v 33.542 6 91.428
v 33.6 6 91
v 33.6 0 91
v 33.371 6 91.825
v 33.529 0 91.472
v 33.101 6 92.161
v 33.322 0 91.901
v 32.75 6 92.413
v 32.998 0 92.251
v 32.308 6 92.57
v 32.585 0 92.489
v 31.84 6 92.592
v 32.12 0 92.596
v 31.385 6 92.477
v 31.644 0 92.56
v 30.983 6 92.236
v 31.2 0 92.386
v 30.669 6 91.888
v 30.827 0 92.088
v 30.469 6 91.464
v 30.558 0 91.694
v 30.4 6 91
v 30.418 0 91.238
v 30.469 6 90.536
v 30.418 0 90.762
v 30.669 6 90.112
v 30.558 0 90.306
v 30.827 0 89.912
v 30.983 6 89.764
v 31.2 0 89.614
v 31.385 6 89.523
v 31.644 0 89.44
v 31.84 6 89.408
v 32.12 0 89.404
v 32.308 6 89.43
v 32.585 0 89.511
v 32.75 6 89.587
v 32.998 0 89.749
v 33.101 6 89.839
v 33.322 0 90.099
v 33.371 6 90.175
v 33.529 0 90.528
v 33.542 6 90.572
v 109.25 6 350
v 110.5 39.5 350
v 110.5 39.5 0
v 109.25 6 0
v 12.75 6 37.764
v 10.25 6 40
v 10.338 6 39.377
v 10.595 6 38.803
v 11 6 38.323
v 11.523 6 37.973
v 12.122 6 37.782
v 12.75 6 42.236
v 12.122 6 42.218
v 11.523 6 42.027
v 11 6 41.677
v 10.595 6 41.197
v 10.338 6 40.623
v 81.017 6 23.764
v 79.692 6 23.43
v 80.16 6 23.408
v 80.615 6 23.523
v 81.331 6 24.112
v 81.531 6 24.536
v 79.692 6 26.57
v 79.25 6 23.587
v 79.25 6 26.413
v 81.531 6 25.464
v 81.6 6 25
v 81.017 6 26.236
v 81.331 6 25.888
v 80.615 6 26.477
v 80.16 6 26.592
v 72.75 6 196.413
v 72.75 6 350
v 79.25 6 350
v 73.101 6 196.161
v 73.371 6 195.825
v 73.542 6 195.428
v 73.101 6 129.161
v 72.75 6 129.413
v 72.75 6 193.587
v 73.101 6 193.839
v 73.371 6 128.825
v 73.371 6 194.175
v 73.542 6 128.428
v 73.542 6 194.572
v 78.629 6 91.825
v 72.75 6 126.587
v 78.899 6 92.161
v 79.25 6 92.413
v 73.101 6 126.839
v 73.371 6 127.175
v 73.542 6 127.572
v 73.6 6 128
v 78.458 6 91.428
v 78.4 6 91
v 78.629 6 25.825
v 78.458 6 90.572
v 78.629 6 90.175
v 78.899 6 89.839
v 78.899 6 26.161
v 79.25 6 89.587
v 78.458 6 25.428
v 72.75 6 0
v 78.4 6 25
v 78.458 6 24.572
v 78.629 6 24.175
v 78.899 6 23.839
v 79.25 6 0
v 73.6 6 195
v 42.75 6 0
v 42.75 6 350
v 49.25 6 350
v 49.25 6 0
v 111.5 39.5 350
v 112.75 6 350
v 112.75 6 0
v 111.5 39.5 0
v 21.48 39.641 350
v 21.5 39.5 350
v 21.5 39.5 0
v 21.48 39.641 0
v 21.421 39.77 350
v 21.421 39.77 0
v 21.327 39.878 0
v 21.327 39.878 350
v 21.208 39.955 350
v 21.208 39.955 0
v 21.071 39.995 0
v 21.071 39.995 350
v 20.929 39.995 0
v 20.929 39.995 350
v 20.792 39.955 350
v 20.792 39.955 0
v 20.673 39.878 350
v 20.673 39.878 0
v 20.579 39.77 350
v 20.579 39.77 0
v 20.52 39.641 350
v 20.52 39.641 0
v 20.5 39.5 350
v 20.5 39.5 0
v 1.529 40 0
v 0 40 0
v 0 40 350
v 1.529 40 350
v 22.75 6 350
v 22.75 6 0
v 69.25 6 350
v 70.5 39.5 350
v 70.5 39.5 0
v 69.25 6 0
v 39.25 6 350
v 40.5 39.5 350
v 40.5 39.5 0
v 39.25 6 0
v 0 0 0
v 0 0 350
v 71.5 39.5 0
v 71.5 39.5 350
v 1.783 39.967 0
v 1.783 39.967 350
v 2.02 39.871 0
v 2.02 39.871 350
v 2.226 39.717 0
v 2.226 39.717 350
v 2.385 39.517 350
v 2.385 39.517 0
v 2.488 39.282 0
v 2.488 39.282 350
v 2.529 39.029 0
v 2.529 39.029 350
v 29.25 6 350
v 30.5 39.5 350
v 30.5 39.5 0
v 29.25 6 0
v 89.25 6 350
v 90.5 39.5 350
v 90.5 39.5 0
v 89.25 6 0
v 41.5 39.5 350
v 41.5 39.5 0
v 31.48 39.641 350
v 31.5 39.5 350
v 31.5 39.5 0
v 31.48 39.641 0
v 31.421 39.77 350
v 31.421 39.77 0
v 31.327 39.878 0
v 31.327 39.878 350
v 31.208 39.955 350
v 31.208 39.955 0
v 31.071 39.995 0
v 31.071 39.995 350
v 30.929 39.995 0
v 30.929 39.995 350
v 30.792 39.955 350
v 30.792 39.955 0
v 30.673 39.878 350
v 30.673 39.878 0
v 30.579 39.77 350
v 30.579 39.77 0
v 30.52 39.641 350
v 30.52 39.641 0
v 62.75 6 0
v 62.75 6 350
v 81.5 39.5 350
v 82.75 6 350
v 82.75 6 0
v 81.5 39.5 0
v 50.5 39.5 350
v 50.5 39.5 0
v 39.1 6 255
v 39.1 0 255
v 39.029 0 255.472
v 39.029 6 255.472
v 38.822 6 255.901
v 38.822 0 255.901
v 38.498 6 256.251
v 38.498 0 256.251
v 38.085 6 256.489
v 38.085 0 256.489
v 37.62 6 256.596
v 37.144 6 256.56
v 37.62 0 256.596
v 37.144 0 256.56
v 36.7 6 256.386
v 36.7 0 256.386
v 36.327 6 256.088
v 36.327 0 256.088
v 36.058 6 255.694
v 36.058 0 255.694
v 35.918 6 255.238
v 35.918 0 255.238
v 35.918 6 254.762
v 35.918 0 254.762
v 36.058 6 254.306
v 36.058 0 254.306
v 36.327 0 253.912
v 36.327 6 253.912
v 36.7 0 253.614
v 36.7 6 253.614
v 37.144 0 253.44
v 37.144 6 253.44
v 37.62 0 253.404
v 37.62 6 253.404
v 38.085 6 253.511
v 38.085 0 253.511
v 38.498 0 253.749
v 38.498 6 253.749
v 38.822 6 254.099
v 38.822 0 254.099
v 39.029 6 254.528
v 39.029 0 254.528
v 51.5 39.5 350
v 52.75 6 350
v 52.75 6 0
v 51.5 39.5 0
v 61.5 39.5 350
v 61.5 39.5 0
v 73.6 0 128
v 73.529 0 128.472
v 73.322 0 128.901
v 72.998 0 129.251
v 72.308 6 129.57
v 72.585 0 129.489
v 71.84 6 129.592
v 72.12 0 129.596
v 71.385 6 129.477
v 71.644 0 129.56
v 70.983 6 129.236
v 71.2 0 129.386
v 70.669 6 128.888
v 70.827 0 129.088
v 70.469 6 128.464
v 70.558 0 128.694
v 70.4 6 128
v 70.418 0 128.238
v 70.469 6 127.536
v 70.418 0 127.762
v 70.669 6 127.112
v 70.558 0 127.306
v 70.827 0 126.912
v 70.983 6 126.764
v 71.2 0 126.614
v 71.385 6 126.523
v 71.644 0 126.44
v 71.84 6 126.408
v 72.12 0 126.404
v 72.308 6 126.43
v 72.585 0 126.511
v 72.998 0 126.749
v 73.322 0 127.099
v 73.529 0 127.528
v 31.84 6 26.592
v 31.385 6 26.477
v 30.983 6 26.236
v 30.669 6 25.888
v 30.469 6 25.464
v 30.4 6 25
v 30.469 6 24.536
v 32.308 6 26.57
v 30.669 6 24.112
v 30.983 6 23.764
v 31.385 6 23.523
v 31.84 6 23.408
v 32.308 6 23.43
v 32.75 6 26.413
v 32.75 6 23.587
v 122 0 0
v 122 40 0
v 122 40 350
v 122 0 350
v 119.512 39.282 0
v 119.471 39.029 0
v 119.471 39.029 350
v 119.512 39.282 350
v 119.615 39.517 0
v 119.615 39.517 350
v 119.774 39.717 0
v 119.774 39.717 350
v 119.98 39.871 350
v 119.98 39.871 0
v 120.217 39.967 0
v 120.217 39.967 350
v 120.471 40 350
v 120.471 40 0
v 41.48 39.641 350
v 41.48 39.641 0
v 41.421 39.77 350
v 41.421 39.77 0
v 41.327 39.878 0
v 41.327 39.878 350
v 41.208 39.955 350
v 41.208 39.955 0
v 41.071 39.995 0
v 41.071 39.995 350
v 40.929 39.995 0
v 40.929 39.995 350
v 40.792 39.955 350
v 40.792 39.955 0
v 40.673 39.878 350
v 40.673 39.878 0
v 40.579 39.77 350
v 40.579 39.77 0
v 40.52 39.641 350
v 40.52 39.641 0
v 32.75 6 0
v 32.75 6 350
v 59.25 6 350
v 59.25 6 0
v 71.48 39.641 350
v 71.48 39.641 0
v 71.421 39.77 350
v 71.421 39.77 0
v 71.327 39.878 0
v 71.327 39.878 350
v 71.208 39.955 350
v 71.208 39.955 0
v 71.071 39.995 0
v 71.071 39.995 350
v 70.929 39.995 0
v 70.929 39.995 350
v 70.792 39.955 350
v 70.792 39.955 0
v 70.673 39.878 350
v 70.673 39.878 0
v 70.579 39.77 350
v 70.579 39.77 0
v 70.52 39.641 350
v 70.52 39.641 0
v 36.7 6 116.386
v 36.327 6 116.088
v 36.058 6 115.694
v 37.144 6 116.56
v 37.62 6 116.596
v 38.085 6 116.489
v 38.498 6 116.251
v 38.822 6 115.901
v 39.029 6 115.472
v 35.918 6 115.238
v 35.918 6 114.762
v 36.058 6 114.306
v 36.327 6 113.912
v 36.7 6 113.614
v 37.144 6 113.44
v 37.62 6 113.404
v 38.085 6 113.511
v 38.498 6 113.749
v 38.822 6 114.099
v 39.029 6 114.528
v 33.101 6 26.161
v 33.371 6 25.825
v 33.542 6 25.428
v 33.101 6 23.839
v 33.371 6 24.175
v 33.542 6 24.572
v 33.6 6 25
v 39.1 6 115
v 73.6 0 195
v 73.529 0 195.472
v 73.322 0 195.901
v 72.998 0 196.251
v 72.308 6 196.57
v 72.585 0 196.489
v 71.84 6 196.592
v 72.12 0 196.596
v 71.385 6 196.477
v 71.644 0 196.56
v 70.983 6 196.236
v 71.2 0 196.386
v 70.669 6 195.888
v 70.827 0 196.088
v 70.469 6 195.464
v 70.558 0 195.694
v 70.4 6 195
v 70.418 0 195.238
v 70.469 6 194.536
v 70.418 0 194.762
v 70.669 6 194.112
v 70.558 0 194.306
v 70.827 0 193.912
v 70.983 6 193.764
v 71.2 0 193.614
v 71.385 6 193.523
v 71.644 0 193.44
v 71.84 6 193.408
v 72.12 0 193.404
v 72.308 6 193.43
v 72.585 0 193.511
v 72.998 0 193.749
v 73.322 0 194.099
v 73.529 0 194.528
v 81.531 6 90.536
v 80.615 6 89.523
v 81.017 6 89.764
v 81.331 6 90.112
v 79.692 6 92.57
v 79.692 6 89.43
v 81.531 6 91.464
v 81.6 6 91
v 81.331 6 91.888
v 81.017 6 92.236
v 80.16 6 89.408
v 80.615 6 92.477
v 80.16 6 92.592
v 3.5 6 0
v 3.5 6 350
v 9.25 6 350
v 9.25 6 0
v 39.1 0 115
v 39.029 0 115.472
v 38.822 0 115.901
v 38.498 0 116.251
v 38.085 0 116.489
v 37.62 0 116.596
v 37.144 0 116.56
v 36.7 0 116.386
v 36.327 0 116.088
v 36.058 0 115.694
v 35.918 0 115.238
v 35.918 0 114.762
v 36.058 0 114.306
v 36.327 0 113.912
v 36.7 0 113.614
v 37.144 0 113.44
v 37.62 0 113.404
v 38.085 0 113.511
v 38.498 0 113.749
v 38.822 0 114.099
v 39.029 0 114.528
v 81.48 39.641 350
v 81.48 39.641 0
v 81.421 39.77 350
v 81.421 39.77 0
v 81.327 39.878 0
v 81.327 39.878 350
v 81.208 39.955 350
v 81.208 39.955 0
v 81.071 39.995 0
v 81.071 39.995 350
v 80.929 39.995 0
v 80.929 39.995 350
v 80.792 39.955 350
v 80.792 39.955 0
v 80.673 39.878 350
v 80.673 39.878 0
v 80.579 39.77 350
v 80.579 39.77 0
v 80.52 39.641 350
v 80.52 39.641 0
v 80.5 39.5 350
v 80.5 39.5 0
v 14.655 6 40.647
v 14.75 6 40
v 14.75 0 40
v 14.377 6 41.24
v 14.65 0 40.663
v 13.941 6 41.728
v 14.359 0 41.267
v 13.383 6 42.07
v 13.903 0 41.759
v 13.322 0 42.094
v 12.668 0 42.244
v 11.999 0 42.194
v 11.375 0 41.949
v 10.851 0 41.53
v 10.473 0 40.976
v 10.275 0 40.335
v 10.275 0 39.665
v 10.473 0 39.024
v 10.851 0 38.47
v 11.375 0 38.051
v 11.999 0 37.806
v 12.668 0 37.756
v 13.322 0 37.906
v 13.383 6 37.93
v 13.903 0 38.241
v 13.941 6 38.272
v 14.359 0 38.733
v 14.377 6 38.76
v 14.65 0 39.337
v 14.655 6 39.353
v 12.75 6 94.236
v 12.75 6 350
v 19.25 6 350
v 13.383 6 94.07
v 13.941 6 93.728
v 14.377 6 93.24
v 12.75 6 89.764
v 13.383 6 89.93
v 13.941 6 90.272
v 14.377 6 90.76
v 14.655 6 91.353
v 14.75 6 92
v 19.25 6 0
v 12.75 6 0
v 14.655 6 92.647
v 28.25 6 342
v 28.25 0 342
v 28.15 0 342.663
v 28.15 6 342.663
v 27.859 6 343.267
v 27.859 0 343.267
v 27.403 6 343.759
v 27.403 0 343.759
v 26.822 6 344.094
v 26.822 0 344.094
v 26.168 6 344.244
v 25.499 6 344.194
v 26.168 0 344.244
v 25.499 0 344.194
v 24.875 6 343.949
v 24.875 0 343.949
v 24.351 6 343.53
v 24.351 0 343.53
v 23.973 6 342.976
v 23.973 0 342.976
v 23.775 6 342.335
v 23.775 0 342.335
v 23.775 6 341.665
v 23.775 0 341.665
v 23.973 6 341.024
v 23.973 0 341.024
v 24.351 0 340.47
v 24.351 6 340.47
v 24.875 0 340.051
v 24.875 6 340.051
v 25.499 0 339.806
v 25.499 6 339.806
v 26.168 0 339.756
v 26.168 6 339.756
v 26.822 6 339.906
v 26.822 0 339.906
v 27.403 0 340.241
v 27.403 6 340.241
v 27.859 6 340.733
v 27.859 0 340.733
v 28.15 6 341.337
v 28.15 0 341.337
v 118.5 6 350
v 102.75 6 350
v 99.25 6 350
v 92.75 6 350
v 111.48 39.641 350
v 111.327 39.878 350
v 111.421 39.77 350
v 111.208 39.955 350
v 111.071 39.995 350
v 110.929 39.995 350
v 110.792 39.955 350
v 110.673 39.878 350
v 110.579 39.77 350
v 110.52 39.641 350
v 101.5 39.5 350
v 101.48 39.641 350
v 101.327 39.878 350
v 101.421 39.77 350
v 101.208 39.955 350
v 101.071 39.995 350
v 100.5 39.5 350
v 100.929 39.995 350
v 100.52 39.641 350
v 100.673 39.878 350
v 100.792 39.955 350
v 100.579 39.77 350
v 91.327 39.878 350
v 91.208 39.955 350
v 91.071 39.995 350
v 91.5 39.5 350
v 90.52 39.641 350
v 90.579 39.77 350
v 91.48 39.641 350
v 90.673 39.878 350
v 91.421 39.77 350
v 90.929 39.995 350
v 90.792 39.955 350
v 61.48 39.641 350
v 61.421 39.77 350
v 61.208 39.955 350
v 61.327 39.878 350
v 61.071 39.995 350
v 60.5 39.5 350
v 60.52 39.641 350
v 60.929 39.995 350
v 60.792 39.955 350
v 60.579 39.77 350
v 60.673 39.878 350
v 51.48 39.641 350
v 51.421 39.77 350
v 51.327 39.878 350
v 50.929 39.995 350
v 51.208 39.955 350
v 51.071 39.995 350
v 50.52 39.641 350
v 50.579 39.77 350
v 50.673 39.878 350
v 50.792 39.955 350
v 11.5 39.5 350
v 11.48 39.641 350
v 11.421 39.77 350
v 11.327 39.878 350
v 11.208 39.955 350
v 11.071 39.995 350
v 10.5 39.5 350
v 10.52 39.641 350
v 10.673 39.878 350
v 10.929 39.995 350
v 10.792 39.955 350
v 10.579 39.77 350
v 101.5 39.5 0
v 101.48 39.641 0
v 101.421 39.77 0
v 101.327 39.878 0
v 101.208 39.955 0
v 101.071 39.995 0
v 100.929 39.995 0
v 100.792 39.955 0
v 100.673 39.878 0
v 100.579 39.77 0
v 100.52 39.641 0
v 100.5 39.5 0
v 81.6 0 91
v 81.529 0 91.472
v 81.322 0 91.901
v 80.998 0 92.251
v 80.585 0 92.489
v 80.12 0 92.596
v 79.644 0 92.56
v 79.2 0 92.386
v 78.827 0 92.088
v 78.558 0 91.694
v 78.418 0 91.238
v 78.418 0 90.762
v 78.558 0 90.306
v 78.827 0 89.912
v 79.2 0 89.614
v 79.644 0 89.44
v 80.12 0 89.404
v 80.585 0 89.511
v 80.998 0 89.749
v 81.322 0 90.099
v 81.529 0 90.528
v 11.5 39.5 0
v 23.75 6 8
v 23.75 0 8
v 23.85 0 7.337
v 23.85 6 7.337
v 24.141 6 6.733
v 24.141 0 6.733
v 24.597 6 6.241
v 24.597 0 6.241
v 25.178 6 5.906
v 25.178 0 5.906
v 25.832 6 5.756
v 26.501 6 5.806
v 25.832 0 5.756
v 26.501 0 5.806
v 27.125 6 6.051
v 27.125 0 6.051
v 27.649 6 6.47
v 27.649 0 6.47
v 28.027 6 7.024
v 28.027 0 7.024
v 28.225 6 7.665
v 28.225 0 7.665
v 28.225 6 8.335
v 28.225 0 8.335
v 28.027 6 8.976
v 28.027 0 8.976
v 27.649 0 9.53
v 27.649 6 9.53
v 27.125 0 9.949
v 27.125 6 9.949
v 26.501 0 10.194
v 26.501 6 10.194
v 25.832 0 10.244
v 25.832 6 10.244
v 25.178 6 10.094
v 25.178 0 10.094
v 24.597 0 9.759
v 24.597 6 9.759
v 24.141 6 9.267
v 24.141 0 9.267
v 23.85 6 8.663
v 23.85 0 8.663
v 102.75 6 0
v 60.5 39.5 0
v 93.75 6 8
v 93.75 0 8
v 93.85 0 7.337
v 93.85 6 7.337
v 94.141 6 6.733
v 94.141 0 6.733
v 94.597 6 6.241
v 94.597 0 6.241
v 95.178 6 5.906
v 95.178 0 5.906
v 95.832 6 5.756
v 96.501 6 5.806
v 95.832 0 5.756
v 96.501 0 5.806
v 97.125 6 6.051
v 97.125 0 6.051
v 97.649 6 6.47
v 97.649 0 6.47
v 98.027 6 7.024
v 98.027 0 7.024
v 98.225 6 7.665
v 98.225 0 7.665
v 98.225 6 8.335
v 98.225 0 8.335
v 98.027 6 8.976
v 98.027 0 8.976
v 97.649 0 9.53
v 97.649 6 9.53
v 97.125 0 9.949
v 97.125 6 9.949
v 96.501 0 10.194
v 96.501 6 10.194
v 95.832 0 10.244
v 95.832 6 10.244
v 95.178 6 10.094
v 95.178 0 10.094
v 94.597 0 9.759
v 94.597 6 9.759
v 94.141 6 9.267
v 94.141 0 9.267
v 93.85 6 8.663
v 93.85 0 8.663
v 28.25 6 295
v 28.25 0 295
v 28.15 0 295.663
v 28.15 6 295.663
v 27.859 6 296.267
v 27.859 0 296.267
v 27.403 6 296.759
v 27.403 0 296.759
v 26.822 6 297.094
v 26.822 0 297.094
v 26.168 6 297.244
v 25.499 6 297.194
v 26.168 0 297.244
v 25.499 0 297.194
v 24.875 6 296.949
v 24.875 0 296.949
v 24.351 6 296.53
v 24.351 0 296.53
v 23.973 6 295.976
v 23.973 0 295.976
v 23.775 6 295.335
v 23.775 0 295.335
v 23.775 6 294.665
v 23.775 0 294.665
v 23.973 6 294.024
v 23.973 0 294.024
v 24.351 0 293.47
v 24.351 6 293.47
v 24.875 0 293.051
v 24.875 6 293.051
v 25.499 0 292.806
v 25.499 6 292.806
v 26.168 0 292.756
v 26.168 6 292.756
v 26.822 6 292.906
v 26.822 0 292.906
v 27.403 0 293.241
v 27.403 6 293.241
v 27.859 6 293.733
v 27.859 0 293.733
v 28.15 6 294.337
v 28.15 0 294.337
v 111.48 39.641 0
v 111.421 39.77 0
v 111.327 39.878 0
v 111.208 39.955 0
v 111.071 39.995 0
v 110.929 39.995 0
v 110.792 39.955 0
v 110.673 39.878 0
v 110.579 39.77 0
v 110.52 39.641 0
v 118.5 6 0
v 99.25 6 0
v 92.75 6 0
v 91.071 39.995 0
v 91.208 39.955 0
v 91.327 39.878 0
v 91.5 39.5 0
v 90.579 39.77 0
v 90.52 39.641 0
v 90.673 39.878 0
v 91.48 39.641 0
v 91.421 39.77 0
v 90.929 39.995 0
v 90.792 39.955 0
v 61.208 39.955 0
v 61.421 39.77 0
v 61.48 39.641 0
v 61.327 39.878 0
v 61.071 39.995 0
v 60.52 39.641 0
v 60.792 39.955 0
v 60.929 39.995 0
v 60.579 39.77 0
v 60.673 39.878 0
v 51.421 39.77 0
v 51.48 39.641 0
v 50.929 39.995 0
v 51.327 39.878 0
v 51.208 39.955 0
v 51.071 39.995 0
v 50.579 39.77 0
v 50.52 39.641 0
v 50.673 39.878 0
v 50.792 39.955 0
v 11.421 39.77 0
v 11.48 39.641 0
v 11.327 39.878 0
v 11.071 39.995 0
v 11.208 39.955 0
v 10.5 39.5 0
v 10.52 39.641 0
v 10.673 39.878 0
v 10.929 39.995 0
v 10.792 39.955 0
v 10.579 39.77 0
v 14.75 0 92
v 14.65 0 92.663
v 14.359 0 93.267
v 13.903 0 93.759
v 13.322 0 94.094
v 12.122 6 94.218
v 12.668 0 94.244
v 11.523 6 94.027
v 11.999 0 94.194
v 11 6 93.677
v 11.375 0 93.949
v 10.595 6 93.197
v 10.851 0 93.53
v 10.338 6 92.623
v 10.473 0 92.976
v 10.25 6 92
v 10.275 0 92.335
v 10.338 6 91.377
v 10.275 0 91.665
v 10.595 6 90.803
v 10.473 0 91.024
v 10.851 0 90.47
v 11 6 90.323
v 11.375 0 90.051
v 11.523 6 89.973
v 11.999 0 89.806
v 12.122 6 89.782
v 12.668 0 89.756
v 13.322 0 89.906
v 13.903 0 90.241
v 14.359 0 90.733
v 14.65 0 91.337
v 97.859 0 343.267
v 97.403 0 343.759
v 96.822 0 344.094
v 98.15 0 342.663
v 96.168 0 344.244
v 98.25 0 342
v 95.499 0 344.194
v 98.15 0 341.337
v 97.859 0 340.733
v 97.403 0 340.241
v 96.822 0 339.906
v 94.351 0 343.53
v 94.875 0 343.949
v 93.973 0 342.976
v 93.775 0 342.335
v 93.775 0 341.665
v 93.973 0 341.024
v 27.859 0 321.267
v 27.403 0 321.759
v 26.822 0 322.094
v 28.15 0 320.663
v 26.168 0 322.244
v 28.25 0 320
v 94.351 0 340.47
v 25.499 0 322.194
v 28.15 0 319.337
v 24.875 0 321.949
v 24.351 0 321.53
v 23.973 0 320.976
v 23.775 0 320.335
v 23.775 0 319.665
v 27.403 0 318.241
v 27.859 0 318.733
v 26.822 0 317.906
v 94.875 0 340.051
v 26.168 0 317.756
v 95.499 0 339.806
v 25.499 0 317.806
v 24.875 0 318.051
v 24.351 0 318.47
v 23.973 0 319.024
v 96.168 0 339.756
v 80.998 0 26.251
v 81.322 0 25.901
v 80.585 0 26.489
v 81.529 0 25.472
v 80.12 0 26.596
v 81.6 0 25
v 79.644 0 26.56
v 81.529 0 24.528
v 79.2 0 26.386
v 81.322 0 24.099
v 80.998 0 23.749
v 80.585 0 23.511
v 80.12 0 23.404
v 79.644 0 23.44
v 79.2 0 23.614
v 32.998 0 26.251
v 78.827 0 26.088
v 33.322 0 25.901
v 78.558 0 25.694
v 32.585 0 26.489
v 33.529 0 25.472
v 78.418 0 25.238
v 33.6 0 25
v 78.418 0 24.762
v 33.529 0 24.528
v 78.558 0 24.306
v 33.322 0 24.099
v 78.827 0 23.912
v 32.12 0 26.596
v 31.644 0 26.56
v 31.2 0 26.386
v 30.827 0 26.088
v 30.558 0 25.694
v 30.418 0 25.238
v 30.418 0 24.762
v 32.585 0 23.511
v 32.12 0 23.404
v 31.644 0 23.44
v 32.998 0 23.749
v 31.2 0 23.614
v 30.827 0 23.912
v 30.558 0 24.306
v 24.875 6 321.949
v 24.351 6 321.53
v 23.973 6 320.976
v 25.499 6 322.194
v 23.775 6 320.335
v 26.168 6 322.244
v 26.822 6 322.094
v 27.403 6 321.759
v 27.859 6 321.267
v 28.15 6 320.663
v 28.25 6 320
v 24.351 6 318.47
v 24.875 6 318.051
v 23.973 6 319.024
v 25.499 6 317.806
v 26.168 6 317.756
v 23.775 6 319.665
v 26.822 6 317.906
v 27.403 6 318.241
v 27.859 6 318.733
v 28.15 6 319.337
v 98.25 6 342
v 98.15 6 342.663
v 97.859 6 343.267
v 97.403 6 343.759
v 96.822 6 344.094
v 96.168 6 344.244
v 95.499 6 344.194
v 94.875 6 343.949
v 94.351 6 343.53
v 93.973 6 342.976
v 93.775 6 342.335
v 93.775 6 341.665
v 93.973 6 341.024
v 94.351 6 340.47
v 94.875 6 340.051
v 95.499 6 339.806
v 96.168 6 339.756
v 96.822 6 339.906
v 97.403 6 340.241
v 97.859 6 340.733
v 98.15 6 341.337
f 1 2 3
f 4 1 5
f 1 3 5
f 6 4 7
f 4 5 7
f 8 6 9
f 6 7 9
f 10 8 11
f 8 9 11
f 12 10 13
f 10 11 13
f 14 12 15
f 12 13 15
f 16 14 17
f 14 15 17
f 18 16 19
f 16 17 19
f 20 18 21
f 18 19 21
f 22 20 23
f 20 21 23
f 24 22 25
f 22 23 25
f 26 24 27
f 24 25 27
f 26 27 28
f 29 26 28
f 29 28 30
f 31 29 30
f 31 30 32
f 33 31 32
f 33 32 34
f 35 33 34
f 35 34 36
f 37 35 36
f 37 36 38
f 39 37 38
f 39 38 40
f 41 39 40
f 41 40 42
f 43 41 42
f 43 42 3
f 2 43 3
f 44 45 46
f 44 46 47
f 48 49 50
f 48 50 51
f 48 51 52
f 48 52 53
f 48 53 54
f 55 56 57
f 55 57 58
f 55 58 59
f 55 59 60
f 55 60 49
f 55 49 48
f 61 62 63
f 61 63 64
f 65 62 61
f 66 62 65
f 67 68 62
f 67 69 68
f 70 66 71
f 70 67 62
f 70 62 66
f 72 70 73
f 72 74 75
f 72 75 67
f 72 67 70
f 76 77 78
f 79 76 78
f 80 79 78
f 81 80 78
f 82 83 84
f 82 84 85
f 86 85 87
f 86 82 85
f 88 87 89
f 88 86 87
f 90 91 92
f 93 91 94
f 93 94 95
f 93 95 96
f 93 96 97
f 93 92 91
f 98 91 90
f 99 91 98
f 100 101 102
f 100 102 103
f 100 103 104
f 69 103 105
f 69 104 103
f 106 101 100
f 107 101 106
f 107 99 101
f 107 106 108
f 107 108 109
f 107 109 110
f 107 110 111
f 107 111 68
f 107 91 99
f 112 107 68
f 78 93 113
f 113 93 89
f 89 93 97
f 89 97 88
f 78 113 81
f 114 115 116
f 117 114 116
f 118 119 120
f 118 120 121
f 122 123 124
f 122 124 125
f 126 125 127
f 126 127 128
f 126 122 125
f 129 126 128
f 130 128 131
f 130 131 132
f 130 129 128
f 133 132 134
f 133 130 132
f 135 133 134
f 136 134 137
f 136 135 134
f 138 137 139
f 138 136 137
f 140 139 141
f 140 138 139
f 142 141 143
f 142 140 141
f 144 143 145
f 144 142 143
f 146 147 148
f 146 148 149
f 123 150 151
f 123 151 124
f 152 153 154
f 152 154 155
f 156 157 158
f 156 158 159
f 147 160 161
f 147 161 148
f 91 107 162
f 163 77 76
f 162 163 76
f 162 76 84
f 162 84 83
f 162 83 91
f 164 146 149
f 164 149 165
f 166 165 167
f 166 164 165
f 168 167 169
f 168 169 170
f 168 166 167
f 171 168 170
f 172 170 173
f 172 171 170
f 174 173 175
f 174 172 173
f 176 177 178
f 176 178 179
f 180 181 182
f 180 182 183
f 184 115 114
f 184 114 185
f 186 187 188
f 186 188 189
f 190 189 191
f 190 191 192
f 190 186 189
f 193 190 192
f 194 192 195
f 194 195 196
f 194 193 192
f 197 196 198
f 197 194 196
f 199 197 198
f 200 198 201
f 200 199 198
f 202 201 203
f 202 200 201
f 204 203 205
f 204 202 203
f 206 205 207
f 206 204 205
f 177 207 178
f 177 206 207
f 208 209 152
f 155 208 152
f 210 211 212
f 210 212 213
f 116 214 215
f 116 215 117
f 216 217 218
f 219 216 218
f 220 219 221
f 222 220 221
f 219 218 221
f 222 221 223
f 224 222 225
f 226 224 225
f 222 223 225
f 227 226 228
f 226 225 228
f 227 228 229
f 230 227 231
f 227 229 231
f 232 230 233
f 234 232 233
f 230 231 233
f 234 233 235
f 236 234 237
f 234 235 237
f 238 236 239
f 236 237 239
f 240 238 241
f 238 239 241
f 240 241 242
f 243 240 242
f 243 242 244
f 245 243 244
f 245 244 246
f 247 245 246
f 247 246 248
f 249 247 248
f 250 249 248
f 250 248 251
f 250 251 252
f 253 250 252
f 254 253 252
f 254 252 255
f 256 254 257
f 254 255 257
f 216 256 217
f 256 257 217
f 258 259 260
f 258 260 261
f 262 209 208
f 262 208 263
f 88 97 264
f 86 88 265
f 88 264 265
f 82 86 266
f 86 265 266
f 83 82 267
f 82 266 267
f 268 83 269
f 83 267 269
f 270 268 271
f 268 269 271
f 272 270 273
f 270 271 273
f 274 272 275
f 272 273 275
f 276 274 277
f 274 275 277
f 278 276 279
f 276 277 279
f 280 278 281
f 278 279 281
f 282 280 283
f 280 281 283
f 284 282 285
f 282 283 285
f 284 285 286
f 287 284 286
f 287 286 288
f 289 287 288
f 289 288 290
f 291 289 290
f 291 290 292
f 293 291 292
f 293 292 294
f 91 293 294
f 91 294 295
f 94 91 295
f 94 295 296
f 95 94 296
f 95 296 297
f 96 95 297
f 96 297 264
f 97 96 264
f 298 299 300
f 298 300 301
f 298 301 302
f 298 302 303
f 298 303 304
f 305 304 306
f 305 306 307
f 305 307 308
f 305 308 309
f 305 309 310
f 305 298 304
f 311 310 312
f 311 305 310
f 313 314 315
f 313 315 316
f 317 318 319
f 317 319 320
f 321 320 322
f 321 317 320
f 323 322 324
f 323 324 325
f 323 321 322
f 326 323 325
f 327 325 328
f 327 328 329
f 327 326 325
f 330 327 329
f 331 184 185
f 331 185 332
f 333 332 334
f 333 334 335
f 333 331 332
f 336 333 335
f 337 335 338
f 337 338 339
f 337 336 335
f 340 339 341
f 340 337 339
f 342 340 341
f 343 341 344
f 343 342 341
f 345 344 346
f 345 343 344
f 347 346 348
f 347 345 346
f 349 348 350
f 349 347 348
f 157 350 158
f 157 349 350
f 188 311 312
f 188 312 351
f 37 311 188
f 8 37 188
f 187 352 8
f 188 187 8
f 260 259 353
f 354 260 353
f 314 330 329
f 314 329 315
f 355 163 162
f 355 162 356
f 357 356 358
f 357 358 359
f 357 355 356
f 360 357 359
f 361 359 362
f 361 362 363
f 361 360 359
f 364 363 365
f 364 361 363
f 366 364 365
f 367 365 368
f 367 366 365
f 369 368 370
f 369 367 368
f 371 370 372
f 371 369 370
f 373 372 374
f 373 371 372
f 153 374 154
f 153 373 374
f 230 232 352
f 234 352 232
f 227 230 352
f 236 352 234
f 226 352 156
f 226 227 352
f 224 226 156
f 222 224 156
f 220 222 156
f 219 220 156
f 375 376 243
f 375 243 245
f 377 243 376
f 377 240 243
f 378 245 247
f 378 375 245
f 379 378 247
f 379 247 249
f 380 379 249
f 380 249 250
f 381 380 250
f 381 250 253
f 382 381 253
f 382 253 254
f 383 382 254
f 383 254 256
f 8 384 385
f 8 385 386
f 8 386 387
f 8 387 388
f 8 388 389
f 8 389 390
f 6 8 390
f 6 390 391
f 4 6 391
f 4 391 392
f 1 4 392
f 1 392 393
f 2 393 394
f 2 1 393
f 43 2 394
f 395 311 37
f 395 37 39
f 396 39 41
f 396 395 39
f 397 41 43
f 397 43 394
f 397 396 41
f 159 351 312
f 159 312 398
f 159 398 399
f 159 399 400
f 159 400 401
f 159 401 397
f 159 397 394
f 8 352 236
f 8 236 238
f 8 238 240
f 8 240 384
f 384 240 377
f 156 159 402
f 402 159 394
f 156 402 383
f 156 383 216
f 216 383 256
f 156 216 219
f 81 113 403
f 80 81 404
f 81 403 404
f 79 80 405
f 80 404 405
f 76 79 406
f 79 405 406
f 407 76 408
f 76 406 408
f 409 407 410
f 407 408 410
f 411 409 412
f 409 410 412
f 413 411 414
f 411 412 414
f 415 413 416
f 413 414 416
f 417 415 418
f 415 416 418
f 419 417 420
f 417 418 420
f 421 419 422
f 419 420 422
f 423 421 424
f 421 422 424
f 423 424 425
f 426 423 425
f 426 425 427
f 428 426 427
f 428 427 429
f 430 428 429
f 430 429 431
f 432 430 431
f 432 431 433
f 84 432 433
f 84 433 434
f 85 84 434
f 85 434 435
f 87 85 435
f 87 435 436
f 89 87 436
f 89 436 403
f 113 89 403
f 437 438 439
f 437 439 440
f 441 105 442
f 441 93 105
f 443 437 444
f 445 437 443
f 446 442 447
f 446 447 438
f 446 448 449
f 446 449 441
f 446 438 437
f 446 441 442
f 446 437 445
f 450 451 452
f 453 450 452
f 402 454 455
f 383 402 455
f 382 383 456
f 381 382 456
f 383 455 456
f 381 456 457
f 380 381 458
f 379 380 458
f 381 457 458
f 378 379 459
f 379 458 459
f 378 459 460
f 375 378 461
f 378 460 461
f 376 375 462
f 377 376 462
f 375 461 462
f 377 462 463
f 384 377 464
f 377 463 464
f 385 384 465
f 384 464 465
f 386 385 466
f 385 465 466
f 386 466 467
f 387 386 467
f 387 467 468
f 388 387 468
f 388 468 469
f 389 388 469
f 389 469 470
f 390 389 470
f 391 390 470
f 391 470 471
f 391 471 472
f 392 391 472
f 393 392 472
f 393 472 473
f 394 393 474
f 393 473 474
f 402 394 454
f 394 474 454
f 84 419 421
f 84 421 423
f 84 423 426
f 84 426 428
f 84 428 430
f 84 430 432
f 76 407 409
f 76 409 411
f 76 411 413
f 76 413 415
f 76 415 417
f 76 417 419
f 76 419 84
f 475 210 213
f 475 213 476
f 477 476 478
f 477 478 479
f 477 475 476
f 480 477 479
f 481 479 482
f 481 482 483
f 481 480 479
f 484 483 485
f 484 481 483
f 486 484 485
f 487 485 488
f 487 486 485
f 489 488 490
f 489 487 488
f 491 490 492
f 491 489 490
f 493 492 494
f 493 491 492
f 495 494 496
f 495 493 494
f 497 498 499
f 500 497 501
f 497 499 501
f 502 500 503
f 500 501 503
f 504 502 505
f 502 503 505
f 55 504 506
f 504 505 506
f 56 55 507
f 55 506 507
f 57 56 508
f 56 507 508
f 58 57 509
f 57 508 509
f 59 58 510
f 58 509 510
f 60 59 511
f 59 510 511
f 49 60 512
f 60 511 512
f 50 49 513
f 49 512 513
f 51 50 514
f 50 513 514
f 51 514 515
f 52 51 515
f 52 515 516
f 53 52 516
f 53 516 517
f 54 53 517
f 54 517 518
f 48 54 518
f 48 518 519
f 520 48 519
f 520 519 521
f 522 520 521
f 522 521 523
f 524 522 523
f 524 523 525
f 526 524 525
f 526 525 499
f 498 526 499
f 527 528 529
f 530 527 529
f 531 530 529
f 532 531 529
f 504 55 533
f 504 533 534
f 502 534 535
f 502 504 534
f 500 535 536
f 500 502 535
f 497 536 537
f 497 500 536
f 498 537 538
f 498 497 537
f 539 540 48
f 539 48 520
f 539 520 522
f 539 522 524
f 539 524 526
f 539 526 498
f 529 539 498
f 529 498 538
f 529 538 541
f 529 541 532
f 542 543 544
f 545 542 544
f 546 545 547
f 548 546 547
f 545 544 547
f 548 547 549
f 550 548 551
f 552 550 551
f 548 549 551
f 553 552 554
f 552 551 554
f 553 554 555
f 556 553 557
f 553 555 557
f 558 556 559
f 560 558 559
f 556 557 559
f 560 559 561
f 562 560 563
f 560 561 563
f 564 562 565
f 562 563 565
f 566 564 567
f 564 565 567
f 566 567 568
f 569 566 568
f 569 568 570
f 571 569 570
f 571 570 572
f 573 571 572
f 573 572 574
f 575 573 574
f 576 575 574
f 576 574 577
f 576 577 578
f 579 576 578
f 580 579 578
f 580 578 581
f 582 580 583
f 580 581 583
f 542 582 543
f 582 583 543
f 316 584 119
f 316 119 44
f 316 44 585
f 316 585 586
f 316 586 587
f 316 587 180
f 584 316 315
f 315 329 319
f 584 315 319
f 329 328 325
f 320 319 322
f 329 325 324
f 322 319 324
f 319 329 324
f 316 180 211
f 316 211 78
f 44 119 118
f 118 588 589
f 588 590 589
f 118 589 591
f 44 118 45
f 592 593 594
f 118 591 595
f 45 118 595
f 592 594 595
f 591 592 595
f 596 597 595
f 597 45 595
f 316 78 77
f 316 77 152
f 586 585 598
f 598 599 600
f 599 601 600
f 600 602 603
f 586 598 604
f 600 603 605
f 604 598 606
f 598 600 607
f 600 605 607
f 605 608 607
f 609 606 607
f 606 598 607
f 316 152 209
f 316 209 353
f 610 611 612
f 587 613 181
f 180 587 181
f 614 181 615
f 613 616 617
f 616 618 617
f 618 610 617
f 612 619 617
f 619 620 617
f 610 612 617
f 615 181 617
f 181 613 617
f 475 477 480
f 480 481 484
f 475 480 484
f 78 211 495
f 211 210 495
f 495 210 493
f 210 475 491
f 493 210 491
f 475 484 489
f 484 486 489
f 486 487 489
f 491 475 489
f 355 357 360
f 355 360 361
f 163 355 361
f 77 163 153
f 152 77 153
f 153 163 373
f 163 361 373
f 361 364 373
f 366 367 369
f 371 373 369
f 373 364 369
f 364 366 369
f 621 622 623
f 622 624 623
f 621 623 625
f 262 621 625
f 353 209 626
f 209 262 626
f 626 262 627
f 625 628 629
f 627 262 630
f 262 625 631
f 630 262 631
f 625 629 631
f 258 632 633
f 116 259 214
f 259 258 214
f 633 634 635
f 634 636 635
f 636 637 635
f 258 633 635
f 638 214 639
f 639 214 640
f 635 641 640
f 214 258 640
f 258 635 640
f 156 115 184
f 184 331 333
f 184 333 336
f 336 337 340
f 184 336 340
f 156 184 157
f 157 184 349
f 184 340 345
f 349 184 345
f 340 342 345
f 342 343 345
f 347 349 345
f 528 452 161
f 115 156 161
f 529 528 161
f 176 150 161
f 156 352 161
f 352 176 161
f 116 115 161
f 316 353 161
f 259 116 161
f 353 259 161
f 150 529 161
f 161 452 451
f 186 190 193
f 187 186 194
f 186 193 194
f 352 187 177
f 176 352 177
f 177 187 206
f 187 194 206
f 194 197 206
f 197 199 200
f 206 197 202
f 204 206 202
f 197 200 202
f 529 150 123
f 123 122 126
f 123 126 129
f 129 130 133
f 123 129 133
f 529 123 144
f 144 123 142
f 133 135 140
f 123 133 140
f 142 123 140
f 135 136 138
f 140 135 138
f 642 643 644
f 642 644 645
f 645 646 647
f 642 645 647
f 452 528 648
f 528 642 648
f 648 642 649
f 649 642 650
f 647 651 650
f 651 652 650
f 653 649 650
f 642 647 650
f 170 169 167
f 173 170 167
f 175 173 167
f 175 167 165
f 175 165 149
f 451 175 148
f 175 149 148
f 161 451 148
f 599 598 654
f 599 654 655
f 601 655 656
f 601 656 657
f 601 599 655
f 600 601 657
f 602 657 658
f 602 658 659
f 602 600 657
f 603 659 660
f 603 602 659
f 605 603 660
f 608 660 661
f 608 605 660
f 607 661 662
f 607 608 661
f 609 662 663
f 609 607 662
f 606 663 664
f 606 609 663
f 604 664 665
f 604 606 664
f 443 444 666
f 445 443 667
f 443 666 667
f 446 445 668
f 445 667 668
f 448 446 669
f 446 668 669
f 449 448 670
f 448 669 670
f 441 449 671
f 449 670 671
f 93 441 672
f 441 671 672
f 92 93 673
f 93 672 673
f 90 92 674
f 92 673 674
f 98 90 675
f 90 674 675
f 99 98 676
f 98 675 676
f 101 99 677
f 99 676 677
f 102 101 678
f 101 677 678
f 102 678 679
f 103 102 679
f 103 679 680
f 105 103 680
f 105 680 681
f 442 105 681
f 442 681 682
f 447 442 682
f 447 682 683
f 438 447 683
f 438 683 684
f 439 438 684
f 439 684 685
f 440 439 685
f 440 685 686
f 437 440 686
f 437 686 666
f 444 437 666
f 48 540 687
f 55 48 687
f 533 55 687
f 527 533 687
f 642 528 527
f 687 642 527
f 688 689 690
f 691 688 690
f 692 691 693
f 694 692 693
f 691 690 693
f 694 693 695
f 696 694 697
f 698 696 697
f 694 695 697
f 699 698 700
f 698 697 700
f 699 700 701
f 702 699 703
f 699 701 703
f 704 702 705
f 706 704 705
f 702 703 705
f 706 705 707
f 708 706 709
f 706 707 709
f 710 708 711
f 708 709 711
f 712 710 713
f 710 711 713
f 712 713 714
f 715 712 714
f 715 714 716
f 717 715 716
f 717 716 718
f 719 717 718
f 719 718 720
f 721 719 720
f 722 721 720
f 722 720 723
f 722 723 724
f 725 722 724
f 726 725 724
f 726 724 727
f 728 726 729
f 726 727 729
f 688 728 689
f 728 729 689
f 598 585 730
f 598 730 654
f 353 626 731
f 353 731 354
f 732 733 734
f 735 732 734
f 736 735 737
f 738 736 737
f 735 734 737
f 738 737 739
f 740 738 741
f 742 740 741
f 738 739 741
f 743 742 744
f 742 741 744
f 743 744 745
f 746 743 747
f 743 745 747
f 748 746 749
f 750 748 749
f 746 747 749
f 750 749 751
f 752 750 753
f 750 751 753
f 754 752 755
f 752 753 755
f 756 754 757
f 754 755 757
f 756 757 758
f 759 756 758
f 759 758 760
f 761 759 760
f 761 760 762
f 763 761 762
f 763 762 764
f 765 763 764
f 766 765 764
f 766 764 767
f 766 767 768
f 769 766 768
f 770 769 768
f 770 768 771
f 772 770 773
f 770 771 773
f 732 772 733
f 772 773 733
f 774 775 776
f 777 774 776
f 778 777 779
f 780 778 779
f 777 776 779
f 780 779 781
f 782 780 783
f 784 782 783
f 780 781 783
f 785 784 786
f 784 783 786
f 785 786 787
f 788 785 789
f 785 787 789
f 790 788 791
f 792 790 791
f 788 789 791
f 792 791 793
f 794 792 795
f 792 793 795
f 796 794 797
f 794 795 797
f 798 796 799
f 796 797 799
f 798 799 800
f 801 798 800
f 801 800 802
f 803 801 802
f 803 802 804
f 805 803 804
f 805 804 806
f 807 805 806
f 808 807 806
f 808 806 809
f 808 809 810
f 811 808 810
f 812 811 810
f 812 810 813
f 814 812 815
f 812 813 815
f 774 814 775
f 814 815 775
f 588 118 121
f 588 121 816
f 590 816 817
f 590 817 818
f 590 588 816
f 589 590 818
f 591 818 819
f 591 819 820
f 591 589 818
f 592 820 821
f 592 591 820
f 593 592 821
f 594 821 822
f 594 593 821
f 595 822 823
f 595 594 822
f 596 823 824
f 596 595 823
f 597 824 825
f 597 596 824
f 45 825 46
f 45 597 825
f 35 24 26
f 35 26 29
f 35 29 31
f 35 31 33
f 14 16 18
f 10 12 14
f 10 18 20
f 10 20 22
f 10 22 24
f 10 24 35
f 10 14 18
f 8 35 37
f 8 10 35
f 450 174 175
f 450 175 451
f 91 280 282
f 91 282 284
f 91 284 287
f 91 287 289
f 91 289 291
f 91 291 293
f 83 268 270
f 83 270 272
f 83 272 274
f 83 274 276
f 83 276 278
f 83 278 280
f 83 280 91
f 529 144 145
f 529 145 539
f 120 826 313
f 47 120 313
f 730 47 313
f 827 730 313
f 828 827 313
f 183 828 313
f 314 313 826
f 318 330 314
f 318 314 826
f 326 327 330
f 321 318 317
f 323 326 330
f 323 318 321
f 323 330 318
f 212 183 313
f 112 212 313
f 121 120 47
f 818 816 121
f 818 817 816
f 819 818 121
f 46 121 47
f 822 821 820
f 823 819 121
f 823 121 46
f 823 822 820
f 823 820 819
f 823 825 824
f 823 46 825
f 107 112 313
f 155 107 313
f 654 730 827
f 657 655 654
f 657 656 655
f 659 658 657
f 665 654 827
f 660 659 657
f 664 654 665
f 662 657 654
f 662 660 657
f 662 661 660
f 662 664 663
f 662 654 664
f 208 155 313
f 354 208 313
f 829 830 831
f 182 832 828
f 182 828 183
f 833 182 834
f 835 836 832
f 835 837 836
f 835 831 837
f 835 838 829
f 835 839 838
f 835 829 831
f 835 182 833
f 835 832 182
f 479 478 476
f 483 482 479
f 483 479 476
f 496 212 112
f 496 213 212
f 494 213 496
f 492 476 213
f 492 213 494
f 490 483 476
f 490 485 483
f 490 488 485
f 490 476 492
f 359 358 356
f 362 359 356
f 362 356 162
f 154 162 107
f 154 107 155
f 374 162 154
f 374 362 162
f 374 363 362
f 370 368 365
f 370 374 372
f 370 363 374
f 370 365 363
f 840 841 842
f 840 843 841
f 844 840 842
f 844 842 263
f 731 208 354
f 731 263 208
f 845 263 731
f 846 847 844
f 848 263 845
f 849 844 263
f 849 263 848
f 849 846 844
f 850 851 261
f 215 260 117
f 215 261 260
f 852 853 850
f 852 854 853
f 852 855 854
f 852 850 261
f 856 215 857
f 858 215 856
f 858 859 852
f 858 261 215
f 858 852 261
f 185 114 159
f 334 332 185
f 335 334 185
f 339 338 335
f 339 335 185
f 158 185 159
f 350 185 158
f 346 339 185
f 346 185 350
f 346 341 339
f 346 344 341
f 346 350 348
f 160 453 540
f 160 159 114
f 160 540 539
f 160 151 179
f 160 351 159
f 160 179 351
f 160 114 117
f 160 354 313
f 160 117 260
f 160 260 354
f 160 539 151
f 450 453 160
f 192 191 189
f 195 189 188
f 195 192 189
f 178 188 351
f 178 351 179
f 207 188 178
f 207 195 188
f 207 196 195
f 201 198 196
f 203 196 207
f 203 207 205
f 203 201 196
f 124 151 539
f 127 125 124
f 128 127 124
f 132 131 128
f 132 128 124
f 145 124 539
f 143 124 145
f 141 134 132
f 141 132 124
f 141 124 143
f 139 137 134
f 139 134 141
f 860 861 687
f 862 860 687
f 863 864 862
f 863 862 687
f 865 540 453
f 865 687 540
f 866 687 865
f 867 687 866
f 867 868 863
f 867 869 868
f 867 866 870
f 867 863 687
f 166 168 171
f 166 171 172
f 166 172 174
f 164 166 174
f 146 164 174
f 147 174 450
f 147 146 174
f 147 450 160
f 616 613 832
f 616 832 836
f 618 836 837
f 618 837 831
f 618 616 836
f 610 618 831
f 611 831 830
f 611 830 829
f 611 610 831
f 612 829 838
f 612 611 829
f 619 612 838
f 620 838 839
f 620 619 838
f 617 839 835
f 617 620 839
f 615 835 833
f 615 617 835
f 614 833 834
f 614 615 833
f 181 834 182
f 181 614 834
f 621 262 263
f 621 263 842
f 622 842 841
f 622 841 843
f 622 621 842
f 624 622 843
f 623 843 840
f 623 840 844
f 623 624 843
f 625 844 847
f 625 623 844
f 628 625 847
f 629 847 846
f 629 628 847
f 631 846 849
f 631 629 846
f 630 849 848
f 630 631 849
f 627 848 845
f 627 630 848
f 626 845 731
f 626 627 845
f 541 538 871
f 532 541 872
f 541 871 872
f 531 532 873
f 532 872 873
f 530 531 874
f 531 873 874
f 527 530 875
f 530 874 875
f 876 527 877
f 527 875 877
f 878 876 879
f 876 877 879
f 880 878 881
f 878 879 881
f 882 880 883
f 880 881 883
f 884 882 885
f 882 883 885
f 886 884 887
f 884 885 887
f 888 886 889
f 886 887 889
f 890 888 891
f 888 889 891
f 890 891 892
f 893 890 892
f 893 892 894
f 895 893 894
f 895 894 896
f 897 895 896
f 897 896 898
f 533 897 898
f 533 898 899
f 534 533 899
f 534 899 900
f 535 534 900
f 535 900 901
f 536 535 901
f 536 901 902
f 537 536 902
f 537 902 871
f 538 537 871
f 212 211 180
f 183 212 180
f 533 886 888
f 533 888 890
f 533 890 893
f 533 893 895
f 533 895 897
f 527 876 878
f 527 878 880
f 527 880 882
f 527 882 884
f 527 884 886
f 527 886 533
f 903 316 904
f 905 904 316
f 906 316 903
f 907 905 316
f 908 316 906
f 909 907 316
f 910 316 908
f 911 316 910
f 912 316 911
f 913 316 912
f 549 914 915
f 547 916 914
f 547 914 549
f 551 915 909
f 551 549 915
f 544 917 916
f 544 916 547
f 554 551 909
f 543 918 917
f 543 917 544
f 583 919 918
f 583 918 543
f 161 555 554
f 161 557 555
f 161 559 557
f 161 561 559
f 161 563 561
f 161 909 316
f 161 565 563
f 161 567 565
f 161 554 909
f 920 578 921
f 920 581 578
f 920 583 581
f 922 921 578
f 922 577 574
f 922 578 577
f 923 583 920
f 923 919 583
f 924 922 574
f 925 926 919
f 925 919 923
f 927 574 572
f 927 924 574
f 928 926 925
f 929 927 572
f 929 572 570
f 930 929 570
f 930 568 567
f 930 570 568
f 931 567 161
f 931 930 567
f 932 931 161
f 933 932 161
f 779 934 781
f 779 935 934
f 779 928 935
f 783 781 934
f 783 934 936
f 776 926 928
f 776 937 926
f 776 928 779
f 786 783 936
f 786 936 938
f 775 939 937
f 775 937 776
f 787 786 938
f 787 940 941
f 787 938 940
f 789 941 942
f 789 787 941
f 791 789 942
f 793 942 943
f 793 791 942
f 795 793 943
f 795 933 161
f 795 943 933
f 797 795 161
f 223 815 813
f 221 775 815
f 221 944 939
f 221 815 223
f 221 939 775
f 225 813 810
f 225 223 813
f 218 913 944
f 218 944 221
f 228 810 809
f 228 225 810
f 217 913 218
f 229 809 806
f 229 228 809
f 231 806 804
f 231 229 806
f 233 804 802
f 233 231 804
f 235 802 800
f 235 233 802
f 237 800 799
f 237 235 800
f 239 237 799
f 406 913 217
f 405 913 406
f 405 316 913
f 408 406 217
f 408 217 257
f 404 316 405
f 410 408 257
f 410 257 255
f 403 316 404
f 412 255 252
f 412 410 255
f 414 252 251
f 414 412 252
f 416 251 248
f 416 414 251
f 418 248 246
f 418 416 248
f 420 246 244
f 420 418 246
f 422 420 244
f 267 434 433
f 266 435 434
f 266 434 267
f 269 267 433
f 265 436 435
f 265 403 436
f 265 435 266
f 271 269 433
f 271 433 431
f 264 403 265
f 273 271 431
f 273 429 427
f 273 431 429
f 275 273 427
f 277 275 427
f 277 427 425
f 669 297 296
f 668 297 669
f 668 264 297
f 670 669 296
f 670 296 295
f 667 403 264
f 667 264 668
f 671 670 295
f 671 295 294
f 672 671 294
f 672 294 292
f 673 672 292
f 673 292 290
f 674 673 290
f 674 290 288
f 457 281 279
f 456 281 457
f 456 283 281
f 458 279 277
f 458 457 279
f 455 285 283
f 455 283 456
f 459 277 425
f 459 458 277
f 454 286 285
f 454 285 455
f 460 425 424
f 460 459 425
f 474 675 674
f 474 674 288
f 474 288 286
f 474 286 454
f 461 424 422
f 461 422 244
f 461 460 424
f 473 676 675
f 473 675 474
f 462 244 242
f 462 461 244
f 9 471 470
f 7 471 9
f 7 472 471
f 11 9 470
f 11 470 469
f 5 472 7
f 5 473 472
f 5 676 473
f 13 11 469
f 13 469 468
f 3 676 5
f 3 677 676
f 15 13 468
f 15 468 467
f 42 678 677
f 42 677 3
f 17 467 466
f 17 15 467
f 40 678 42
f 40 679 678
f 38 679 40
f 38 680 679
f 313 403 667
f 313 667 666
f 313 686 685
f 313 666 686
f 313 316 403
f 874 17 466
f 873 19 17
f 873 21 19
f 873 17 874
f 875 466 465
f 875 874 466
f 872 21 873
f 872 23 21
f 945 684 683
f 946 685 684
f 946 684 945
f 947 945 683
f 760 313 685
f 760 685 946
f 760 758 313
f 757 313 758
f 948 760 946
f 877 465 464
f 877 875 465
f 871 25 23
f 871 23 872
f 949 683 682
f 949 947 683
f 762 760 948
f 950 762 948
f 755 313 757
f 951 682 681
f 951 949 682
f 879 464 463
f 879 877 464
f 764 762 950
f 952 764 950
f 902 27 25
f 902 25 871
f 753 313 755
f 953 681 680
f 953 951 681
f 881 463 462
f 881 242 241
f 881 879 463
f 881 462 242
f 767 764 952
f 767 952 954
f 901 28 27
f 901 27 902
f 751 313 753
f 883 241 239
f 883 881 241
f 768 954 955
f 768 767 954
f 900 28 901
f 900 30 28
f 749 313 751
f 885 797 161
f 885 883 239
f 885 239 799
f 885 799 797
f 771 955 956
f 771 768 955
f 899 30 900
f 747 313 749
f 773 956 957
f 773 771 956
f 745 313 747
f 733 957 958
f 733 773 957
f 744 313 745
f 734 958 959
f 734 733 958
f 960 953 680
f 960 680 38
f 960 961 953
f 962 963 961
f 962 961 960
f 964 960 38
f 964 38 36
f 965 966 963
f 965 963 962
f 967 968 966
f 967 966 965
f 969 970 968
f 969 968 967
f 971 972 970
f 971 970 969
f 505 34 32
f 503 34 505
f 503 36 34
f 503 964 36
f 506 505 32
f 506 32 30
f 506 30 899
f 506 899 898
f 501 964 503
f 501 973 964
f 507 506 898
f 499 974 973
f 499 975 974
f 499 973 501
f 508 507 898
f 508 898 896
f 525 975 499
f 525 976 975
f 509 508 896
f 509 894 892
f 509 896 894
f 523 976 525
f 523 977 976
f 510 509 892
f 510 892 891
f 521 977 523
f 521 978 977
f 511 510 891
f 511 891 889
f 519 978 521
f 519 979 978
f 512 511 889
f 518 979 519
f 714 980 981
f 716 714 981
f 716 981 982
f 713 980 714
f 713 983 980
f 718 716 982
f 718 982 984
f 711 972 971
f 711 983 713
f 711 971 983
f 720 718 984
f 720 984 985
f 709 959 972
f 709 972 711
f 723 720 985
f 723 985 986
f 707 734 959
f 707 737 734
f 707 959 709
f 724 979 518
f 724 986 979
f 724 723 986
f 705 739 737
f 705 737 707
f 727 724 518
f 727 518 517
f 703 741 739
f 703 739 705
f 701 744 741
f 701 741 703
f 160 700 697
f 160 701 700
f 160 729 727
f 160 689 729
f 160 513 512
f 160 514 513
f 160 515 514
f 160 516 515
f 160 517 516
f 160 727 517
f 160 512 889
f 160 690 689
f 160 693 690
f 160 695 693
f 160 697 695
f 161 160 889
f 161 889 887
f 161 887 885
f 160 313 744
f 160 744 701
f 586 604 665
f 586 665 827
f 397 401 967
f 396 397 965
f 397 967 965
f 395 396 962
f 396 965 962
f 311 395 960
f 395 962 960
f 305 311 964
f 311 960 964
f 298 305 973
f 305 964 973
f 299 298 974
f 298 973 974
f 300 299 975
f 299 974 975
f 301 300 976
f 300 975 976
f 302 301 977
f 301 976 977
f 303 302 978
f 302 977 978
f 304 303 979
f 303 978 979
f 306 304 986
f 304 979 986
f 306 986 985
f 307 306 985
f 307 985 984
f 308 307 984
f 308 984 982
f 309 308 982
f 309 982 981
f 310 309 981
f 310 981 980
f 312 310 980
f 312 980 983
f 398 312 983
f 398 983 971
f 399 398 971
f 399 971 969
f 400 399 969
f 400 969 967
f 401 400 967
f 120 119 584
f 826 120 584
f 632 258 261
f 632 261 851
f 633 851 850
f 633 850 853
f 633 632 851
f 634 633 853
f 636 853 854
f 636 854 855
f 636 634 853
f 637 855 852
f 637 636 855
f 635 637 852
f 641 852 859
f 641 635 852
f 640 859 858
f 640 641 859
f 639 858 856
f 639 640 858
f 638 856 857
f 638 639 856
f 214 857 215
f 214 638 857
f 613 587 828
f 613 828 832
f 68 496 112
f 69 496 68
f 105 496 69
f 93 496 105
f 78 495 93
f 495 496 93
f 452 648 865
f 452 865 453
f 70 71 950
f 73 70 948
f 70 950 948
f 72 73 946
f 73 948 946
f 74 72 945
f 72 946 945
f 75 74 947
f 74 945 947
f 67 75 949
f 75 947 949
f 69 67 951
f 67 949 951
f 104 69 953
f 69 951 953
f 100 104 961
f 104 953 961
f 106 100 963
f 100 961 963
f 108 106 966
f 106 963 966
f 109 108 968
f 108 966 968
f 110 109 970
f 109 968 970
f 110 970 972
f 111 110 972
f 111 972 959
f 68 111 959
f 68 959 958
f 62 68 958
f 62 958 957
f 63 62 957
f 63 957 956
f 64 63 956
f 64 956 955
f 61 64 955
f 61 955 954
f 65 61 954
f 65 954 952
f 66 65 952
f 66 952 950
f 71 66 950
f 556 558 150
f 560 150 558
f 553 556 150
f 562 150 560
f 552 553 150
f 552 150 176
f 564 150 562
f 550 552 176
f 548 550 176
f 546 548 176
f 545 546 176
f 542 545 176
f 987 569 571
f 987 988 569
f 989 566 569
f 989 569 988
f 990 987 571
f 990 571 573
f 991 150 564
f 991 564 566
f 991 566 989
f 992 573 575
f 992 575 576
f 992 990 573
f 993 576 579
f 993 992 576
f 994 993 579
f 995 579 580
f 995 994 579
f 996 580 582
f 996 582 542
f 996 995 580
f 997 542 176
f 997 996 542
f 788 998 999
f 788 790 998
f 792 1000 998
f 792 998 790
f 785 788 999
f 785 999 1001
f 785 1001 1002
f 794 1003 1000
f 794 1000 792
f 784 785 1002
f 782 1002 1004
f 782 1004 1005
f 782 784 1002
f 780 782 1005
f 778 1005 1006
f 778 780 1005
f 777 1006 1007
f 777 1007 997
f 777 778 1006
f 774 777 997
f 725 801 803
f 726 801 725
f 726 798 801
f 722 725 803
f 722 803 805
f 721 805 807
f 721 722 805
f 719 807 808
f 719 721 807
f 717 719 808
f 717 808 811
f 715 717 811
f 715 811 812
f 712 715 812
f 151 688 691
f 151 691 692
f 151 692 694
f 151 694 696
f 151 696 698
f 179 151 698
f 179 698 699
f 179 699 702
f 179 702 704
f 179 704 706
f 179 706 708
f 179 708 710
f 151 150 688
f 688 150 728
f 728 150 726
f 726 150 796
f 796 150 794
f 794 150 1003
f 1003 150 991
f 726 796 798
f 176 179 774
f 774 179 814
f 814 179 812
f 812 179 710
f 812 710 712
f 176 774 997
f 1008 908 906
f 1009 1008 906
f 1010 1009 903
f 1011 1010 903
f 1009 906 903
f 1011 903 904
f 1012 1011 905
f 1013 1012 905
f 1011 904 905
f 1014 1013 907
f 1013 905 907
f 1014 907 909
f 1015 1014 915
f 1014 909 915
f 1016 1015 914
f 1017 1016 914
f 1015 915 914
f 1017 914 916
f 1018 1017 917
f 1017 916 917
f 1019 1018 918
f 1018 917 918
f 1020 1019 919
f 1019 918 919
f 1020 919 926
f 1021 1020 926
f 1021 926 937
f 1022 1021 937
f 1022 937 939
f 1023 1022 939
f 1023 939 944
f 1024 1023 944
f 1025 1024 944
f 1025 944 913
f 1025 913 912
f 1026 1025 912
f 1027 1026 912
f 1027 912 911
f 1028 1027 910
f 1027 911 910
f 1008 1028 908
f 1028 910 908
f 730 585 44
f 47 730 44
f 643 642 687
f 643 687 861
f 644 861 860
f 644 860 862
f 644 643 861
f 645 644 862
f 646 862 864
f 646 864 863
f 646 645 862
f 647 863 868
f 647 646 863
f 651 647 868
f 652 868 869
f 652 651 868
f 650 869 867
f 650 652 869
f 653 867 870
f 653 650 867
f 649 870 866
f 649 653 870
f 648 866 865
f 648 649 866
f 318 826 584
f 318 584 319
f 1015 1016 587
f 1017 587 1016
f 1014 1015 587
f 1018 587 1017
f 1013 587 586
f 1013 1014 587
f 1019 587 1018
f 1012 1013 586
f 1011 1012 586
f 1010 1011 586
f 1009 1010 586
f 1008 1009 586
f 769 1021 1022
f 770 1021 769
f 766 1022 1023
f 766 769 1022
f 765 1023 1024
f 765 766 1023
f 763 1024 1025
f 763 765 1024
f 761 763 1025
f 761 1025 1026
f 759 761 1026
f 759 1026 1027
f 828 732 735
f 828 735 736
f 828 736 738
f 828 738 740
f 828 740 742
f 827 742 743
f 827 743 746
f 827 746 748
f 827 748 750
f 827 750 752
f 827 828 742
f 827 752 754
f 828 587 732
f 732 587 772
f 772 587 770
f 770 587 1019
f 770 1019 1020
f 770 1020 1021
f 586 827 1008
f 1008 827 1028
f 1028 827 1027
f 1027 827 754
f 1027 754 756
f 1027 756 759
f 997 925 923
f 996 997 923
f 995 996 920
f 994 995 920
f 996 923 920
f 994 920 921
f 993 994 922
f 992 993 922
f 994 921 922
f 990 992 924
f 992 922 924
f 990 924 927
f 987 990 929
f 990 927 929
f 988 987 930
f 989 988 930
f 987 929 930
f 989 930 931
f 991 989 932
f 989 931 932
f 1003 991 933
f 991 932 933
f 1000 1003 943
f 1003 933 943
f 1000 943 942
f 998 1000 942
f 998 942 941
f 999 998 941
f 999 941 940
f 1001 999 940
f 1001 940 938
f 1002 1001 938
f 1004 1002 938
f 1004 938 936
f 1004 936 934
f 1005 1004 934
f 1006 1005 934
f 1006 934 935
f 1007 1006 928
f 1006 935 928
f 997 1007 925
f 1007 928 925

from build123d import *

# Parameters (mm, degrees)
EXTRUDE_1_DEPTH       = 350
EXTRUDE_3_DEPTH       = 350
PATTERN_CURVE_1_COUNT = 11
PATTERN_CURVE_1_PITCH = 10
SKETCH_3_R            = 2.25
CUT_EXTRUDE_1_DEPTH   = 6
SKETCH_4_R            = 2.25
SKETCH_4_R_2          = 1.6
CUT_EXTRUDE_2_DEPTH   = 6


with BuildPart() as part:
    # Эскиз1 → Вытянуть1 (new body)
    with BuildSketch(Plane.XY):
        with BuildLine():
            Line((0, 40), (1.528979332, 40))
            ThreePointArc((1.528979332, 40), (2.225614441, 39.717425624), (2.528547087, 39.029399052))
            Line((2.528547087, 39.029399052), (3.5, 6))
            Line((3.5, 6), (118.5, 6))
            Line((118.5, 6), (119.471452913, 39.029399052))
            ThreePointArc((119.471452913, 39.029399052), (119.774385559, 39.717425624), (120.471020668, 40))
            Line((120.471020668, 40), (122, 40))
            Line((122, 40), (122, 0))
            Line((122, 0), (0, 0))
            Line((0, 0), (0, 40))
        make_face()
    extrude(amount=EXTRUDE_1_DEPTH)

    # Эскиз2 → Вытянуть3 (add)
    with BuildSketch(Plane.XY.offset(350)):
        with BuildLine():
            Line((10.5, 39.5), (9.25, 6))
            Line((9.25, 6), (12.75, 6))
            Line((12.75, 6), (11.5, 39.5))
            ThreePointArc((11.5, 39.5), (11, 40), (10.5, 39.5))
        make_face()
    extrude_3 = extrude(amount=-EXTRUDE_3_DEPTH)

    # Кривая1: Вытянуть3 ×11
    with Locations(*[(i * PATTERN_CURVE_1_PITCH, 0, 0) for i in range(1, PATTERN_CURVE_1_COUNT)]):
        add(extrude_3)

    # Эскиз3 → Вырез-Вытянуть1 (cut)
    with BuildSketch(Plane.XZ):
        with Locations((26, 342)):
            Circle(SKETCH_3_R)
        with Locations((96, 342)):
            Circle(SKETCH_3_R)
        with Locations(Location((96, 8, 0), (0, 0, 180))):
            Circle(SKETCH_3_R)
        with Locations(Location((26, 8, 0), (0, 0, 180))):
            Circle(SKETCH_3_R)
    extrude(amount=-CUT_EXTRUDE_1_DEPTH, mode=Mode.SUBTRACT)

    # Эскиз4 → Вырез-Вытянуть2 (cut)
    with BuildSketch(Plane.XZ):
        with Locations((12.5, 40)):
            Circle(SKETCH_4_R)
        with Locations((12.5, 92)):
            Circle(SKETCH_4_R)
        with Locations((32, 25)):
            Circle(SKETCH_4_R_2)
        with Locations((80, 25)):
            Circle(SKETCH_4_R_2)
        with Locations((80, 91)):
            Circle(SKETCH_4_R_2)
        with Locations((32, 91)):
            Circle(SKETCH_4_R_2)
        with Locations((37.5, 115)):
            Circle(SKETCH_4_R_2)
        with Locations((37.5, 255)):
            Circle(SKETCH_4_R_2)
        with Locations((72, 128)):
            Circle(SKETCH_4_R_2)
        with Locations((72, 195)):
            Circle(SKETCH_4_R_2)
        with Locations((26, 295)):
            Circle(SKETCH_4_R)
        with Locations((26, 320)):
            Circle(SKETCH_4_R)
    extrude(amount=-CUT_EXTRUDE_2_DEPTH, mode=Mode.SUBTRACT)


solid = part.part
